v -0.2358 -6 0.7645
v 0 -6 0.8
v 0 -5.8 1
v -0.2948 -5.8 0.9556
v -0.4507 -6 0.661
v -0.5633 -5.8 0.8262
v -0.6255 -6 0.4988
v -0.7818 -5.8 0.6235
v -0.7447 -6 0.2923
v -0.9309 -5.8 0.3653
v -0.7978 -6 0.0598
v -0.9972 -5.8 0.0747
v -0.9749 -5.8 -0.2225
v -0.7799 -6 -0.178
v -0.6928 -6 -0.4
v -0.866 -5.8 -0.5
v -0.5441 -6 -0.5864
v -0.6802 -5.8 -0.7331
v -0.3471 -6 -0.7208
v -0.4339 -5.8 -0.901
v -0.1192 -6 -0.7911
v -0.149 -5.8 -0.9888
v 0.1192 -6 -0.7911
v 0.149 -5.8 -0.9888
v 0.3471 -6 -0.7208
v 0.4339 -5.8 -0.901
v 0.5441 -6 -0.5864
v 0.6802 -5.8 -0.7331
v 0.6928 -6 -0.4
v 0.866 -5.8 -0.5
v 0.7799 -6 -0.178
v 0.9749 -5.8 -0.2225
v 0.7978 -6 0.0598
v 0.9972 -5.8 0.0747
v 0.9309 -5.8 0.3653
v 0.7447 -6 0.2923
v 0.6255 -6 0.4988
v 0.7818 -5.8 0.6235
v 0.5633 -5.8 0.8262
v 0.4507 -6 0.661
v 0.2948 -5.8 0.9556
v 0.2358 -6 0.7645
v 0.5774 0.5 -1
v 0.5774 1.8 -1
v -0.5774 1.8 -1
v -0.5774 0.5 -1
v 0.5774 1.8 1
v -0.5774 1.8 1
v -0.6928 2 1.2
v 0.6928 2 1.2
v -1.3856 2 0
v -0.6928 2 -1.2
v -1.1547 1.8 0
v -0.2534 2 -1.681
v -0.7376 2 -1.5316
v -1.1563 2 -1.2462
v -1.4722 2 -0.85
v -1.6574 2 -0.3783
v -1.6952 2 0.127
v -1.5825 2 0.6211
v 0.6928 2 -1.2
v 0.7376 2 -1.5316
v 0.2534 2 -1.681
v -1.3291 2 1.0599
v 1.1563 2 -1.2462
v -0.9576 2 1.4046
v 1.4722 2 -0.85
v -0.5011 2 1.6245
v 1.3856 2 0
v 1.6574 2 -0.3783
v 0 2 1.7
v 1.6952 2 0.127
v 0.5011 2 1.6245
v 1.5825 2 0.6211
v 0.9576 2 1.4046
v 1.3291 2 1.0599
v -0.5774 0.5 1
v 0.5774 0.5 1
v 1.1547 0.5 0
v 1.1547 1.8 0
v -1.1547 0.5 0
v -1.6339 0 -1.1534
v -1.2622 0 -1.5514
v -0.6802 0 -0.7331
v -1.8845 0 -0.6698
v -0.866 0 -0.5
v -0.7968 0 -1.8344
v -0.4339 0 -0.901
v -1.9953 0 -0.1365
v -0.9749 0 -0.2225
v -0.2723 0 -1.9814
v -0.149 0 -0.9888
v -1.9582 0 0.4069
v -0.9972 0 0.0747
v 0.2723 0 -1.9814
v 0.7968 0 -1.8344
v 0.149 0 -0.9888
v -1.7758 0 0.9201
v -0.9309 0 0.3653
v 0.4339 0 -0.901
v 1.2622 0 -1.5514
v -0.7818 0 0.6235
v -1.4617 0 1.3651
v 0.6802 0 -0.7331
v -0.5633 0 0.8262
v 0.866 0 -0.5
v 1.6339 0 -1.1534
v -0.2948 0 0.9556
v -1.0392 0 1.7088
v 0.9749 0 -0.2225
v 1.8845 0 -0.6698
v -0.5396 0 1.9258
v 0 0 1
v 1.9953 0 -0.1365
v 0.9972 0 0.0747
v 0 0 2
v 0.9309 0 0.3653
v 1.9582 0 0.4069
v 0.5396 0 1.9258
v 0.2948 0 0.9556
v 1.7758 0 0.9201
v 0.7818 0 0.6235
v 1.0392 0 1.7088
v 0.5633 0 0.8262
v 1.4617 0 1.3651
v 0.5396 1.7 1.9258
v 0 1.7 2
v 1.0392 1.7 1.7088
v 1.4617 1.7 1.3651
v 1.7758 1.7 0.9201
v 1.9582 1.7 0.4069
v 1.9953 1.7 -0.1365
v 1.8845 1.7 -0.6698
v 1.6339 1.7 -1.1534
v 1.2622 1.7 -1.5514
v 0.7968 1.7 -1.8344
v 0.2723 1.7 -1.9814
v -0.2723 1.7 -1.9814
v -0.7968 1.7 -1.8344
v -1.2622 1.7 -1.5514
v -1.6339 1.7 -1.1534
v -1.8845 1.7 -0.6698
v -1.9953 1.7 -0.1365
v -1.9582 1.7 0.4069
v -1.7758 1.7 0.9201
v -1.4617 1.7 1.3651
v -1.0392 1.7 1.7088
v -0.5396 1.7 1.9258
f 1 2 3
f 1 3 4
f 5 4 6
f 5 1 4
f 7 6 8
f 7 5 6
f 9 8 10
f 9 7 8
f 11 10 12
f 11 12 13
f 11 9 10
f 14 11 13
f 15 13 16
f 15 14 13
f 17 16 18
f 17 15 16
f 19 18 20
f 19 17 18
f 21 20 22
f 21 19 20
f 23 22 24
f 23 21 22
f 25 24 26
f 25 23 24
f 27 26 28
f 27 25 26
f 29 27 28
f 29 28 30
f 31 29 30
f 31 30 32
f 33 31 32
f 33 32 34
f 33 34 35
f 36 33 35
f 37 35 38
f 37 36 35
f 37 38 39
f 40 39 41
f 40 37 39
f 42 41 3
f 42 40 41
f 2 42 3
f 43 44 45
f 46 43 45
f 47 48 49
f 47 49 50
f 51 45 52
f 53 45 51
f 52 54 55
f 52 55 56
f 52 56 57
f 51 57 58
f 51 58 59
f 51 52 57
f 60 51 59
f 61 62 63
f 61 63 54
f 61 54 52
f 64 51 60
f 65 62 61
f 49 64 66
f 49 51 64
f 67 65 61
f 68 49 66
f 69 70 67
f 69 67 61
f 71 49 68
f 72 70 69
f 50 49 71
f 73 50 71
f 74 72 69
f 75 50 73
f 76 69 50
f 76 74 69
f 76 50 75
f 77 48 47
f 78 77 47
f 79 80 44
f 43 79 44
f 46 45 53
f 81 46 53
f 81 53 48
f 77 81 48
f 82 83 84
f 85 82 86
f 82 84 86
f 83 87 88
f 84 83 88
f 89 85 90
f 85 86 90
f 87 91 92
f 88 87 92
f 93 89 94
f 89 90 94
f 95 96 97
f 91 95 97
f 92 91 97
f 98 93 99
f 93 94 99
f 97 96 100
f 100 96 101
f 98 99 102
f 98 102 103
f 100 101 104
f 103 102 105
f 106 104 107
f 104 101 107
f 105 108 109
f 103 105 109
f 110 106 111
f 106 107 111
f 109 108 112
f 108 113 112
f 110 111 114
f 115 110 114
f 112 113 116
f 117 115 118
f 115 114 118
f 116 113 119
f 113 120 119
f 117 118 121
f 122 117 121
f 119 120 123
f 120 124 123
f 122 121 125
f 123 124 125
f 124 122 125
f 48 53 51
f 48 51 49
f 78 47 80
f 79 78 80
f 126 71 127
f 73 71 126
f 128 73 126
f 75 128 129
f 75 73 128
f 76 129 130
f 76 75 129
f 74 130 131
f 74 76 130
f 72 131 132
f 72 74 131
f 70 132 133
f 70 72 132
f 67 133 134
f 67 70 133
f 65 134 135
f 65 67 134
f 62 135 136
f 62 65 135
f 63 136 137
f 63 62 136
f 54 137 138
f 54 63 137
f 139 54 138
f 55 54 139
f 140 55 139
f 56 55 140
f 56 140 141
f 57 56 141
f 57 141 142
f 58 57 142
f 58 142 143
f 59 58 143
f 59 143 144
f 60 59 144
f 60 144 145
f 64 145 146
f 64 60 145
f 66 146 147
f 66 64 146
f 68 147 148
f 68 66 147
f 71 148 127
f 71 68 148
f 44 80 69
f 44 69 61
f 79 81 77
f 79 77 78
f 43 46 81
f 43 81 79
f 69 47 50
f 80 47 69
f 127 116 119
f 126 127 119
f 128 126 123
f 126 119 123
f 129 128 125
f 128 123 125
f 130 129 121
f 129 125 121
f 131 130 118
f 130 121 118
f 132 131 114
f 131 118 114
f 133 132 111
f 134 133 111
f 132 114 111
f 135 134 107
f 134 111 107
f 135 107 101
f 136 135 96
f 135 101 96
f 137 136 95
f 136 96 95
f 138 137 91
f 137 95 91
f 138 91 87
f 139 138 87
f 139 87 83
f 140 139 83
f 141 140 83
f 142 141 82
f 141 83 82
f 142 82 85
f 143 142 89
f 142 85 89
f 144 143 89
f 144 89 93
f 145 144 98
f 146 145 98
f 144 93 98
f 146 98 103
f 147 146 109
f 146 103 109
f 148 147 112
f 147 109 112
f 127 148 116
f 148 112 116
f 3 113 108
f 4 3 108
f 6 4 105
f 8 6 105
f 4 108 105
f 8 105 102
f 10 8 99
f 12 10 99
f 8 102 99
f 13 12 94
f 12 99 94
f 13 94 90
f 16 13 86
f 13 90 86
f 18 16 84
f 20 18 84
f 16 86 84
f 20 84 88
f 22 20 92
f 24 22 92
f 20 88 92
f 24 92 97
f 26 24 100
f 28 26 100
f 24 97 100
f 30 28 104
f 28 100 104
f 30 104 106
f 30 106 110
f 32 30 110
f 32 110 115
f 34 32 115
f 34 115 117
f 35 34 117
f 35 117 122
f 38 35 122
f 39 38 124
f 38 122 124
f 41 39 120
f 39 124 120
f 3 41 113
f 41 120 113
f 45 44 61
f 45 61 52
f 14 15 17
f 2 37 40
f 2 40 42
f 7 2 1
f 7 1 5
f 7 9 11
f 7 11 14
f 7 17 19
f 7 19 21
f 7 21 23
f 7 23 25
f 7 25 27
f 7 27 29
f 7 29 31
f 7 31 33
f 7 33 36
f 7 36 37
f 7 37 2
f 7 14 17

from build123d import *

# Parameters (mm, degrees)
SKETCH1_R           = 2
BOSS_EXTRUDE1_DEPTH = 2
CHAMFER1_SIZE       = 0.3
CUT_EXTRUDE1_DEPTH  = 1.5
CHAMFER2_SIZE       = 0.2
SKETCH3_R           = 1
BOSS_EXTRUDE2_DEPTH = 6
CHAMFER3_SIZE       = 0.2


with BuildPart() as part:
    # Sketch1 → Boss-Extrude1 (new body)
    with BuildSketch(Plane(origin=(0, 0, 0), x_dir=(1, 0, 0), z_dir=(0, 1, 0))):
        with Locations(Location((0, 0, 0), (0, 0, 270))):  # turned: the seam where the file's is
            Circle(SKETCH1_R)
    extrude(amount=BOSS_EXTRUDE1_DEPTH)

    # Chamfer1
    chamfer1_edges = [part.edges().sort_by_distance(p)[0] for p in [
        (0, 2, -2),
    ]]
    chamfer(chamfer1_edges, length=CHAMFER1_SIZE)

    # Sketch2 → Cut-Extrude1 (cut)
    with BuildSketch(Plane(origin=(0, 2, 0), x_dir=(1, 0, 0), z_dir=(0, 1, 0))):
        Polygon((1.154700538, 0), (0.577350269, 1), (-0.577350269, 1), (-1.154700538, 0), (-0.577350269, -1), (0.577350269, -1), align=None)
    extrude(amount=-CUT_EXTRUDE1_DEPTH, mode=Mode.SUBTRACT)

    # Chamfer2
    chamfer2_edges = [part.edges().sort_by_distance(p)[0] for p in [
        (0.866025404, 2, 0.5),
        (0.866025404, 2, -0.5),
        (0, 2, -1),
        (-0.866025404, 2, -0.5),
        (-0.866025404, 2, 0.5),
        (0, 2, 1),
    ]]
    chamfer(chamfer2_edges, length=CHAMFER2_SIZE)

    # Sketch3 → Boss-Extrude2 (add)
    with BuildSketch(Plane.XZ):
        with Locations(Location((0, 0, 0), (0, 0, 90))):  # turned: the seam where the file's is
            Circle(SKETCH3_R)
    extrude(amount=BOSS_EXTRUDE2_DEPTH)

    # Chamfer3
    chamfer3_edges = [part.edges().sort_by_distance(p)[0] for p in [
        (0, -6, -1),
    ]]
    chamfer(chamfer3_edges, length=CHAMFER3_SIZE)


solid = part.part
